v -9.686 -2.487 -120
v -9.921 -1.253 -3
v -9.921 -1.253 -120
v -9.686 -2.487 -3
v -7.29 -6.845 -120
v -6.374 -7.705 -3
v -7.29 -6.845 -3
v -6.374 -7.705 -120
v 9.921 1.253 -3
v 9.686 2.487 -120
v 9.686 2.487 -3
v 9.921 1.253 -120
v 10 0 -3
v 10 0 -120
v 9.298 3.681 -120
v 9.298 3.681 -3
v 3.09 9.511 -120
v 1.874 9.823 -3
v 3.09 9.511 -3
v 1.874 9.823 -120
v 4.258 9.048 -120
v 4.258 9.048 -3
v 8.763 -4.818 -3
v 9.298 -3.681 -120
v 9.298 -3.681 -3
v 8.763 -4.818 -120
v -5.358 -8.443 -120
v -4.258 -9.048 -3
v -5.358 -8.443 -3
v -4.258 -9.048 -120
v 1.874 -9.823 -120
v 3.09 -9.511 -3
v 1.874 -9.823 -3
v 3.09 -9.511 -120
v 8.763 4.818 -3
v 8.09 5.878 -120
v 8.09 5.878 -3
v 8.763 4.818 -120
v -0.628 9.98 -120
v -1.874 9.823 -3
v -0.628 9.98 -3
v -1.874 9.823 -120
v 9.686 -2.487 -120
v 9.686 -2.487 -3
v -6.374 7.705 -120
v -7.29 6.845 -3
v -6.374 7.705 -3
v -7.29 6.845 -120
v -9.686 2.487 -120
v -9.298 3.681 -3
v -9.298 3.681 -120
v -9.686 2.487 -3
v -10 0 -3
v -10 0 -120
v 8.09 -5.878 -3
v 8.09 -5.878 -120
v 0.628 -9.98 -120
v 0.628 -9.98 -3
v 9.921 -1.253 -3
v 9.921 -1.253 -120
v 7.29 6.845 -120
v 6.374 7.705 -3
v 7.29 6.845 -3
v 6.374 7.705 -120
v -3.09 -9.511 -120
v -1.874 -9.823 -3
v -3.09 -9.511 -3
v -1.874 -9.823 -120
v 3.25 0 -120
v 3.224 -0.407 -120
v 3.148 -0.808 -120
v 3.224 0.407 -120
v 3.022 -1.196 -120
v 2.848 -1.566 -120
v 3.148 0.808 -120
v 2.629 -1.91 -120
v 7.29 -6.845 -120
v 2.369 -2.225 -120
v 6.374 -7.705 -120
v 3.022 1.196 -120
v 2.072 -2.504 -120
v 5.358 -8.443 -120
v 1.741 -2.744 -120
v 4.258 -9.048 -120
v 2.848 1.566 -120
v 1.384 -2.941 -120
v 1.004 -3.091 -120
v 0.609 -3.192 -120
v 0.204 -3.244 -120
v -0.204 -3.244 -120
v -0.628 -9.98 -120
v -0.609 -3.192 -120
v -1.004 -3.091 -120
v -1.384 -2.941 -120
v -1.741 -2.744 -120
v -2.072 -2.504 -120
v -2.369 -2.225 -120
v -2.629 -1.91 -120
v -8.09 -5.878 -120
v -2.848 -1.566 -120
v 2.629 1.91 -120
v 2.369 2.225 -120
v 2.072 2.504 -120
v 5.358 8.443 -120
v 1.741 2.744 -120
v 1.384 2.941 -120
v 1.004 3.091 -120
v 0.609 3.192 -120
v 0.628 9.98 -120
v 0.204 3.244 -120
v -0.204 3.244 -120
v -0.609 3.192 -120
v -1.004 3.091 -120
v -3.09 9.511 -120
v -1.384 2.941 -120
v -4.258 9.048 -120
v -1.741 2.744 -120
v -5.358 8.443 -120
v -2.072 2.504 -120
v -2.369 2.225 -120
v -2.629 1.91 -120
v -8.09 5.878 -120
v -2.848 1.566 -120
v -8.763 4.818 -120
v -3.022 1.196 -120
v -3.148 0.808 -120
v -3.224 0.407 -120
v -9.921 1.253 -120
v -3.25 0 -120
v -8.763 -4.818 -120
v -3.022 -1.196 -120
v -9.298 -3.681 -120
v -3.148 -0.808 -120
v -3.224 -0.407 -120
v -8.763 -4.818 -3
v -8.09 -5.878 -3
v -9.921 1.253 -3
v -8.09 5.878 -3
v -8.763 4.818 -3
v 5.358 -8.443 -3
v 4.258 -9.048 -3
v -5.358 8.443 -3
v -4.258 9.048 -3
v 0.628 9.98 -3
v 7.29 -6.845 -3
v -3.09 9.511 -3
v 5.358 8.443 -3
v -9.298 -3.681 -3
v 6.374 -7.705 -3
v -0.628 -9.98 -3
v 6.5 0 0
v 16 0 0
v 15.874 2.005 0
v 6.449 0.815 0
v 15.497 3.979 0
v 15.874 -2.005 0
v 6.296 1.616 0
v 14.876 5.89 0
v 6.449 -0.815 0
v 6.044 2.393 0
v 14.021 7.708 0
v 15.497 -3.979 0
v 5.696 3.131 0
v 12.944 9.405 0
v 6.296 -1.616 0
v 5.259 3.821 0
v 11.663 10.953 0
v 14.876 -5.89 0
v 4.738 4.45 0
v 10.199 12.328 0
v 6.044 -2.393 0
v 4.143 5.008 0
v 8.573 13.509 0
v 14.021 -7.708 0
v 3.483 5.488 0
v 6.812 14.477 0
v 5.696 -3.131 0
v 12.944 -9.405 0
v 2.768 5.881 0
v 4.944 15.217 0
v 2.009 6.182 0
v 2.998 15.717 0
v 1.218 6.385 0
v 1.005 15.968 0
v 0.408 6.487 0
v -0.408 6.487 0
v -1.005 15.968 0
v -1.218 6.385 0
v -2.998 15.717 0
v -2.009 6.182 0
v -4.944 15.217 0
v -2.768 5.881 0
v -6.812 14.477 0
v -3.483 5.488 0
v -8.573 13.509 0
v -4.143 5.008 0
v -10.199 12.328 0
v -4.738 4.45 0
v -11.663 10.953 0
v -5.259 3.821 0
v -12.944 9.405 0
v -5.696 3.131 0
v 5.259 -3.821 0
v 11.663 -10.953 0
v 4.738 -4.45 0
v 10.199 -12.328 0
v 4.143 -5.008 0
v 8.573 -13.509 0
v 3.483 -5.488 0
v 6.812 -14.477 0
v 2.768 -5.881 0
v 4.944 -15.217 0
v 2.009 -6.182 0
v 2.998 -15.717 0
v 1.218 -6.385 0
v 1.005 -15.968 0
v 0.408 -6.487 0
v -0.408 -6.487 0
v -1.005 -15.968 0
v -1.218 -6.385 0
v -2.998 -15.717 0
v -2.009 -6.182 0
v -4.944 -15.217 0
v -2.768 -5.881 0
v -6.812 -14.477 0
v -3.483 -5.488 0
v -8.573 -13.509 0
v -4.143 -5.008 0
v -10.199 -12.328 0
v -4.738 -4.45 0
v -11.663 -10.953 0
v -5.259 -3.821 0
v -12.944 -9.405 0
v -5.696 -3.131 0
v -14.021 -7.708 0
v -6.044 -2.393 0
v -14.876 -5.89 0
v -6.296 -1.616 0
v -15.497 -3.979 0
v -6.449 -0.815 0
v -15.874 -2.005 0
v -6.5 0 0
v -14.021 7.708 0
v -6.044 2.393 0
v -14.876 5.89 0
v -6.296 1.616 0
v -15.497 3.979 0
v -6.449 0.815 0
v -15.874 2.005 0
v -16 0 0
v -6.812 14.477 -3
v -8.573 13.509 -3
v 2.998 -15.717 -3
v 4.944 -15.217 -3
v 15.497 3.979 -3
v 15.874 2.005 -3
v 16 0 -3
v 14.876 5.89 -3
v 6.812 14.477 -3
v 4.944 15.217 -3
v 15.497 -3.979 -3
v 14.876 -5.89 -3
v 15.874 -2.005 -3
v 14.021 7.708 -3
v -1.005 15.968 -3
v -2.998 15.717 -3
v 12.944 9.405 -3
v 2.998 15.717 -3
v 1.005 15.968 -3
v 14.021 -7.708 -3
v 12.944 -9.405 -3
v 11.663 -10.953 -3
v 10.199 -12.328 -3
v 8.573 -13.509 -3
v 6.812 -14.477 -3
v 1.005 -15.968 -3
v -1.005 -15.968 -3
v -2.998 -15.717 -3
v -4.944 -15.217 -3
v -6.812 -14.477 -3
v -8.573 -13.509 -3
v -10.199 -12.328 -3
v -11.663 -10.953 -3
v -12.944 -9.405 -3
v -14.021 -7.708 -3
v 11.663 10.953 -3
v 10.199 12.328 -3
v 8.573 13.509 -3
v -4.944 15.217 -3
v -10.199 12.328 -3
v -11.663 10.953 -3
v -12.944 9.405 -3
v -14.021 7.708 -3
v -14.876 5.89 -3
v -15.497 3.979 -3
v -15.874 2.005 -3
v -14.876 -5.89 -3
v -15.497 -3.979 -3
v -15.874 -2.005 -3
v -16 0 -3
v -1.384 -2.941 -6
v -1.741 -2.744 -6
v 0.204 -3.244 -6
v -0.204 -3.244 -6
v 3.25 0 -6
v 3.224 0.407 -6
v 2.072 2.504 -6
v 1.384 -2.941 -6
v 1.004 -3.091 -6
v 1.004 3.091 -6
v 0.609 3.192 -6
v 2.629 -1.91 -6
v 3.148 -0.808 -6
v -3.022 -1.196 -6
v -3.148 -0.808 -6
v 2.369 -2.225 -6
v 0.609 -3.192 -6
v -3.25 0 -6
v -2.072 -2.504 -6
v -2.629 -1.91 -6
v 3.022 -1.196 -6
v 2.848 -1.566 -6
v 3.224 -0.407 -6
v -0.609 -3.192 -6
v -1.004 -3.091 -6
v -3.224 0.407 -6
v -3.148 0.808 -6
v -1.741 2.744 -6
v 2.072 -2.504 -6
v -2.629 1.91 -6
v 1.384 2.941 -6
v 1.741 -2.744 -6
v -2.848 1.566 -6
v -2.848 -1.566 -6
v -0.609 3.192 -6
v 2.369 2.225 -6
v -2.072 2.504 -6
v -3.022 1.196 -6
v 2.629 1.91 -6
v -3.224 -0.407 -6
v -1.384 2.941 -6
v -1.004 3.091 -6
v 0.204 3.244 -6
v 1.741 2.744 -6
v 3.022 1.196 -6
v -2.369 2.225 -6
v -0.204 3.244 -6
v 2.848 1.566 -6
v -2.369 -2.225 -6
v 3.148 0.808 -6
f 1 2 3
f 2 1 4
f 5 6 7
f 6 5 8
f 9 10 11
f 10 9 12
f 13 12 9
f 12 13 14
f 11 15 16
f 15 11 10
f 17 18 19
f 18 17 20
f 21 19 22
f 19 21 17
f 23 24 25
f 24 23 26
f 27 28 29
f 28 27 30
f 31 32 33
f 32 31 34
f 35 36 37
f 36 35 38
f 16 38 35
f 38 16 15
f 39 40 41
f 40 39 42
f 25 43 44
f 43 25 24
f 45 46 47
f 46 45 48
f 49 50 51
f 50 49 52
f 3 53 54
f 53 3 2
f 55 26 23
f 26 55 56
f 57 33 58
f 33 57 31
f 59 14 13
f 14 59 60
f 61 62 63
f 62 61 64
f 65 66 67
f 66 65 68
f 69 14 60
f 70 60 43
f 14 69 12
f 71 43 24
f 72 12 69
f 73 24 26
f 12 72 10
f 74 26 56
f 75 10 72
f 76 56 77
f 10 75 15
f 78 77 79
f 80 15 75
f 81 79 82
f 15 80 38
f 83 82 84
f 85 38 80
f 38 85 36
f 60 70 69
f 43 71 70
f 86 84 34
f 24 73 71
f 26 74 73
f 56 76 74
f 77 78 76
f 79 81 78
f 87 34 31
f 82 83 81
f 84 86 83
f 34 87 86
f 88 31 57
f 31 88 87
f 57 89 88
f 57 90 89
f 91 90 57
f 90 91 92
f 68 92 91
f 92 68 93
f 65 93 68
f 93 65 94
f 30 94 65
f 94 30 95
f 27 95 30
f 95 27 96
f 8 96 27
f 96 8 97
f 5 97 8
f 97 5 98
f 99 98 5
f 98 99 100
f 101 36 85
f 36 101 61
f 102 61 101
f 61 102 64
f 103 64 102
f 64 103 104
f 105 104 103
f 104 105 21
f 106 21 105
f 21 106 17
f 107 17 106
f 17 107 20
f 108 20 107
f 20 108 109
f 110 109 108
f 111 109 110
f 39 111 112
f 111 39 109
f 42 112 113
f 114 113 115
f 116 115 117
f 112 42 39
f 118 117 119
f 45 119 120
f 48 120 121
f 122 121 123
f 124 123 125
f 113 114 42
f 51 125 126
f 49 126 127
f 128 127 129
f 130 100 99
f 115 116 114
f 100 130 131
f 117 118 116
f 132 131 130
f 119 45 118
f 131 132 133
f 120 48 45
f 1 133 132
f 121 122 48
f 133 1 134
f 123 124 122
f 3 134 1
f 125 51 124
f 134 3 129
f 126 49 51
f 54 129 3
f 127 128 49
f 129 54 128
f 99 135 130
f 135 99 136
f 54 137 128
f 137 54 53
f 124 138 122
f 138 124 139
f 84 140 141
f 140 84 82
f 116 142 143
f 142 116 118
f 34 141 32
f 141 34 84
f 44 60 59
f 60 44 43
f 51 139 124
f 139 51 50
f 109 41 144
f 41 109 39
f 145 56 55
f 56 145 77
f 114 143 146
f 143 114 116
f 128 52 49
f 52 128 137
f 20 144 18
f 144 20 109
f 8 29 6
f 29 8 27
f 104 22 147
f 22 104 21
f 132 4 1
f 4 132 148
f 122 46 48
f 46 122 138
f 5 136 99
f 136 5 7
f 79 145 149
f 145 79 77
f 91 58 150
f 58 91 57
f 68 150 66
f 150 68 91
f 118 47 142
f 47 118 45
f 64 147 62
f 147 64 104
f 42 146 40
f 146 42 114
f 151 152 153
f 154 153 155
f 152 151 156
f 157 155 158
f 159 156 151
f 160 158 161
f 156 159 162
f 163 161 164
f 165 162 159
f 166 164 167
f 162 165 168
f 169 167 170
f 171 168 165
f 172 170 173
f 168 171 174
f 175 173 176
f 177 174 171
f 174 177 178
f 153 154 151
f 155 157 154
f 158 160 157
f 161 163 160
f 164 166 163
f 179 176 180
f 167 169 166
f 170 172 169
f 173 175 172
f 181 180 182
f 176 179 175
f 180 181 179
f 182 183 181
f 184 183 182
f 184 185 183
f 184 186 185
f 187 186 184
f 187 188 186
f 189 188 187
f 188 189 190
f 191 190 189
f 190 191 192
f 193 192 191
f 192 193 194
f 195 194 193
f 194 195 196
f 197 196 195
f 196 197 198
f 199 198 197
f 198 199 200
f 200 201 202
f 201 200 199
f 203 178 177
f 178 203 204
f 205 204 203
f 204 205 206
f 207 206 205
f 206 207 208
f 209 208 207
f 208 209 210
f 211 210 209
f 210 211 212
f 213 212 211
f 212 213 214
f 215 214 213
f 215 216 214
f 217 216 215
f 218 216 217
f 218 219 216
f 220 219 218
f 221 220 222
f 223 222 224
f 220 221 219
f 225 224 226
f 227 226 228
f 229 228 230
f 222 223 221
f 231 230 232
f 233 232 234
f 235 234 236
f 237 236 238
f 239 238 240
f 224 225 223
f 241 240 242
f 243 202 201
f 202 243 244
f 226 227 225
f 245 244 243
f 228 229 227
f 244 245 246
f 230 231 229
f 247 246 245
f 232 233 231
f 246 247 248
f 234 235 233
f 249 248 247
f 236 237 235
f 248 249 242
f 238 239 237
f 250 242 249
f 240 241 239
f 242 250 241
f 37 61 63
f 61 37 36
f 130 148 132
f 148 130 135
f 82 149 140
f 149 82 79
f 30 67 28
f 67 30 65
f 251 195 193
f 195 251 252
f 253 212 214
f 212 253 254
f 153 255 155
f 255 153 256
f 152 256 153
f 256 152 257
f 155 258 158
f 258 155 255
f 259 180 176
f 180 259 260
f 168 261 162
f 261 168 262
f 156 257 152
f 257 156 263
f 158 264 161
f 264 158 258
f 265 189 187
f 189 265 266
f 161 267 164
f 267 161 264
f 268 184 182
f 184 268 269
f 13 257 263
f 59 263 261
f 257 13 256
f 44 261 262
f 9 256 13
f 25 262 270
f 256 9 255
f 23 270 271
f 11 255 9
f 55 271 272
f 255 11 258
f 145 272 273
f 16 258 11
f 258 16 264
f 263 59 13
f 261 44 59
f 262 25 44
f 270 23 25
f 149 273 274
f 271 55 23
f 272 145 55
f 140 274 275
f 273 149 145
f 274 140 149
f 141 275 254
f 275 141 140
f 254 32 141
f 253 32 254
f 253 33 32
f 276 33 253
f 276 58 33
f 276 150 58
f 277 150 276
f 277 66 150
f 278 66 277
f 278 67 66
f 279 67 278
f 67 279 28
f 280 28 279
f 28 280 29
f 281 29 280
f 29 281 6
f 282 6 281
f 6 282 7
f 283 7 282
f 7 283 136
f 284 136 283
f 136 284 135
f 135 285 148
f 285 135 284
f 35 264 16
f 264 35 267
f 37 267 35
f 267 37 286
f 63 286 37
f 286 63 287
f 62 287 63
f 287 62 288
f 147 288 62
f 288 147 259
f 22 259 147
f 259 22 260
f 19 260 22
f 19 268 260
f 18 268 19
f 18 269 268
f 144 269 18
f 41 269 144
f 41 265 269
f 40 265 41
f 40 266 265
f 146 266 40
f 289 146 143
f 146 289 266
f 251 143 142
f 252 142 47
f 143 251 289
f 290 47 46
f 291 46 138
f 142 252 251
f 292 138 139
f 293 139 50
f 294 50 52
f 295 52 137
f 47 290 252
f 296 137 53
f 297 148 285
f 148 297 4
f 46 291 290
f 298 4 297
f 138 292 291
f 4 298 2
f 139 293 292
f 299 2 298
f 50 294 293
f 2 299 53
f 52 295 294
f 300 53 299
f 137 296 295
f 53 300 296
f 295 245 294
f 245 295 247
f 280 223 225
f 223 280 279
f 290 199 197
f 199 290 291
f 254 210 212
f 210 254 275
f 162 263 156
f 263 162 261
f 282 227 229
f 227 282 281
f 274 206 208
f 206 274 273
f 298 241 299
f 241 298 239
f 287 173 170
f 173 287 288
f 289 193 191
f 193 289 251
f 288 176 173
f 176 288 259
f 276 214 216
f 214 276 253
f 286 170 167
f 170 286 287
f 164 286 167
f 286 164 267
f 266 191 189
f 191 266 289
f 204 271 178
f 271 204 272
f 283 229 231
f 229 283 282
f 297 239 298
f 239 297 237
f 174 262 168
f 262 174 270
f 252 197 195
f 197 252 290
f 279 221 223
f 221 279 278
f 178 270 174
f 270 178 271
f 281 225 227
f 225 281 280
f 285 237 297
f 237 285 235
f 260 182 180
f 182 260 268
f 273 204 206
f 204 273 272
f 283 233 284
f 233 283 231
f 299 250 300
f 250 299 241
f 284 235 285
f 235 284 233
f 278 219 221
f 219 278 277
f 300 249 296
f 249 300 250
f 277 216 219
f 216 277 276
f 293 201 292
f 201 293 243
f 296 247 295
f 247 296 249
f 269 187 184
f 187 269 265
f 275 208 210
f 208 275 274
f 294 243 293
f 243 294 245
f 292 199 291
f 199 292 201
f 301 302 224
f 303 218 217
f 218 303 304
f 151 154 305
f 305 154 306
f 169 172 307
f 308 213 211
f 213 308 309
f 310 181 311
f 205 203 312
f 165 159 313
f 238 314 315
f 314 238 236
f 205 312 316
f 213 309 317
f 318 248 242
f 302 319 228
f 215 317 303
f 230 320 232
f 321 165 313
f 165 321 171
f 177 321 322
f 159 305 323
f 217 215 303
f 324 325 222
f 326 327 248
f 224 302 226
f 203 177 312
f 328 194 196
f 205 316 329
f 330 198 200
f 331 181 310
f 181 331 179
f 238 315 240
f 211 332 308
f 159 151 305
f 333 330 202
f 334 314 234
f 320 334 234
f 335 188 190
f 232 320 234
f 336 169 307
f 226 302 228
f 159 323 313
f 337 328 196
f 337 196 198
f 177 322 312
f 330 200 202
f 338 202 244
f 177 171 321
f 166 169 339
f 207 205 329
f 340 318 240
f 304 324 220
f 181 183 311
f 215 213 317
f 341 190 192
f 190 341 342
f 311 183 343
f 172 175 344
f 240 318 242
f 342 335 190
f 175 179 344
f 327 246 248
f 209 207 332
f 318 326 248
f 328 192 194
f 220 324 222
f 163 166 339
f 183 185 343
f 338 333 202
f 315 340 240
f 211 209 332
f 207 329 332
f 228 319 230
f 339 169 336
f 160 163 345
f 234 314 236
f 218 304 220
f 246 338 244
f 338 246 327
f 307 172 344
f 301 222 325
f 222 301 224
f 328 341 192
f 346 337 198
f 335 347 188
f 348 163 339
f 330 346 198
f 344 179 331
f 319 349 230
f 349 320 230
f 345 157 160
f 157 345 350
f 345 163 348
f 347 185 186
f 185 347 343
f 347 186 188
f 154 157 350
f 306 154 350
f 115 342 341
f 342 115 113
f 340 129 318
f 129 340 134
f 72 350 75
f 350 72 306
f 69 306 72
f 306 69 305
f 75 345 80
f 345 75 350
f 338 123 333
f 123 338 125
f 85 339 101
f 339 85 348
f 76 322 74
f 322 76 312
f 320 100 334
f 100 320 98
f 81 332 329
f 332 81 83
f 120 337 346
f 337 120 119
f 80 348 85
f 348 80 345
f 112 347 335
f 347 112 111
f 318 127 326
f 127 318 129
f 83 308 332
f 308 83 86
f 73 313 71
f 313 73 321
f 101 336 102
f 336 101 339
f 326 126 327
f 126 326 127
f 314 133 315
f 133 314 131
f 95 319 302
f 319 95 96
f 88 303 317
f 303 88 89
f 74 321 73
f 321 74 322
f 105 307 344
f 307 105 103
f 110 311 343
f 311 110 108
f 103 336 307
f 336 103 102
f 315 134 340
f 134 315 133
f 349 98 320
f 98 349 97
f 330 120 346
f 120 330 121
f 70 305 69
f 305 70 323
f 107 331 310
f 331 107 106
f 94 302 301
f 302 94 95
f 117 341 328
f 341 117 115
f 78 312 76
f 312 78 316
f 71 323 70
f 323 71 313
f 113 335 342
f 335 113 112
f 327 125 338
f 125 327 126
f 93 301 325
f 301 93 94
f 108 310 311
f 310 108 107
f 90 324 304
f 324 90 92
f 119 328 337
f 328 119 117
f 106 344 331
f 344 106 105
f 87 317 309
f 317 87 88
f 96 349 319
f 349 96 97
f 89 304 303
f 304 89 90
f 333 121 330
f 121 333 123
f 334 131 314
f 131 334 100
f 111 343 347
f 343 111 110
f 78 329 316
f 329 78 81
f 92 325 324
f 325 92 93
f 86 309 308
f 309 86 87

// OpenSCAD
$fn = 50;


difference() {
	union() {
		translate(v = [0, 0, -120.0000000000]) {
			cylinder(h = 120, r = 10.0000000000);
		}
		translate(v = [0, 0, -3.0000000000]) {
			cylinder(h = 3, r = 16.0000000000);
		}
	}
	union() {
		translate(v = [0, 0, 0]) {
			rotate(a = [0, 0, 0]) {
				difference() {
					union() {
						#translate(v = [0, 0, -120.0000000000]) {
							cylinder(h = 120, r = 2.2500000000);
						}
						#translate(v = [0, 0, -6]) {
							cylinder(h = 6, r = 10.0000000000, r1 = 3.2500000000, r2 = 6.5000000000);
						}
						#translate(v = [0, 0, -120.0000000000]) {
							cylinder(h = 120, r = 3.2500000000);
						}
						#translate(v = [0, 0, -120.0000000000]) {
							cylinder(h = 120, r = 2.2500000000);
						}
					}
					union();
				}
			}
		}
	}
}
